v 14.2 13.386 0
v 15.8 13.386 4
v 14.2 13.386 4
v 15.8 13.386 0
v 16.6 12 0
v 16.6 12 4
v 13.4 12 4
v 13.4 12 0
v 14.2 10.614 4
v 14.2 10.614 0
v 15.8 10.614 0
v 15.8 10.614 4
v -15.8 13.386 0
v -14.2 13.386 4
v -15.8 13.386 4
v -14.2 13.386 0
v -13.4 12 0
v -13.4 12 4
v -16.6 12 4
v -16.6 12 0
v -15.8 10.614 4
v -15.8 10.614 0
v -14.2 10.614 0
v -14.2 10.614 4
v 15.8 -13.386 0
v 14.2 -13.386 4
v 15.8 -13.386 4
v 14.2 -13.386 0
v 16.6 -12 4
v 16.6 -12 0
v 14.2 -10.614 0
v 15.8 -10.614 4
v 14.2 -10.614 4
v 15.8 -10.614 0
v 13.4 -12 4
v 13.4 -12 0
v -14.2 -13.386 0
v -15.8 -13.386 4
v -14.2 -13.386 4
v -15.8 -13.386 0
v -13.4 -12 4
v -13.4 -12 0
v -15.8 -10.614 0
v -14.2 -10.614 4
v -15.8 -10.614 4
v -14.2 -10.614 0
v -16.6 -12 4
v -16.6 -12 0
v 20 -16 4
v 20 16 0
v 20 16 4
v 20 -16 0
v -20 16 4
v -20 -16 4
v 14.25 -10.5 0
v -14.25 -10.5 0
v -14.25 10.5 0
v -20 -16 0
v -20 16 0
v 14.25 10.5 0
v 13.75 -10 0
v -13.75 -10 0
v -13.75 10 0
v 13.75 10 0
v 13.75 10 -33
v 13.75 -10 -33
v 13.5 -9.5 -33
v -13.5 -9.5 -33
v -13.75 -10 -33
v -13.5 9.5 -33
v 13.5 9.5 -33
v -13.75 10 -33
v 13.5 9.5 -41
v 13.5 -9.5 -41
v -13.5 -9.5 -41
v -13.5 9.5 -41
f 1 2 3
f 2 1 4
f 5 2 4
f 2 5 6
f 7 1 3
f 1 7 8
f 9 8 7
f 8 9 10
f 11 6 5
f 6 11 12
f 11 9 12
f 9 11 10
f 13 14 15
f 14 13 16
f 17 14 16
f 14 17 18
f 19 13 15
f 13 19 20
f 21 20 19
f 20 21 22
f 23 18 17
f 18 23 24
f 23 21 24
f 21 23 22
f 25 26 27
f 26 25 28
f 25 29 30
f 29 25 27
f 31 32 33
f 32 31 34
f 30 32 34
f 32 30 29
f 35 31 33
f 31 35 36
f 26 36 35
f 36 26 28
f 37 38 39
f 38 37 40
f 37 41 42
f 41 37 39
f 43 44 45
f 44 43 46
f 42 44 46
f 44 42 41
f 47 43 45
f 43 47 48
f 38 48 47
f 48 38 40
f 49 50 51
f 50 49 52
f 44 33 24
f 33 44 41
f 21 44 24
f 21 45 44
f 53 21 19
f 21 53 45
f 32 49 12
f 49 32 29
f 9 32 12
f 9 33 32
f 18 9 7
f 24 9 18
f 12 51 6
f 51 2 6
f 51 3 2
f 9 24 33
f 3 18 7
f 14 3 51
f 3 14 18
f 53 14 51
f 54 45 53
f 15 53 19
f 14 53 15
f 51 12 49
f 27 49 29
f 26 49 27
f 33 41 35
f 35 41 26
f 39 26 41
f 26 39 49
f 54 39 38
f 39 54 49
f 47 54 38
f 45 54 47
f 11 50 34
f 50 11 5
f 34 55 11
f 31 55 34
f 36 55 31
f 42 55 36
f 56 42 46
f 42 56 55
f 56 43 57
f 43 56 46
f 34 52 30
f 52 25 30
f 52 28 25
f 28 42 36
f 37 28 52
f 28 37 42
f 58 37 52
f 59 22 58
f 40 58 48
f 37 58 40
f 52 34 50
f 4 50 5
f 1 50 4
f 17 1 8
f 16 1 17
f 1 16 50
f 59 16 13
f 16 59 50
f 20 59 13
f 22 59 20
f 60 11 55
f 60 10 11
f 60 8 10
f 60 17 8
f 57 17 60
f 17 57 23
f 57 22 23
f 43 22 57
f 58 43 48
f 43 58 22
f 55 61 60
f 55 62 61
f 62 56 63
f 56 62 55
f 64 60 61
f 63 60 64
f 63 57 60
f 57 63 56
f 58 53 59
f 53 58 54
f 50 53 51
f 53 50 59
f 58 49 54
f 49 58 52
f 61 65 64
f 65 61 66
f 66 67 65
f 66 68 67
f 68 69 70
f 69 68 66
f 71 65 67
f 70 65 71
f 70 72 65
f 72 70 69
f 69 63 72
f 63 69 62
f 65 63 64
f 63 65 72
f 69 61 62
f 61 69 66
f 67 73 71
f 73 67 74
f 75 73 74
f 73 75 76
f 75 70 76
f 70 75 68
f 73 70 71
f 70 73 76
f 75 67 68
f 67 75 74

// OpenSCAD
// Parameters
overall_width_mm = 40.0; //[20.0:80.0:0.5]
overall_height_mm = 32.0; //[16.0:64.0:0.5]
panel_thickness_mm = 2.0; //[0.8:6.0:0.1]
cutout_width_mm = 27.5; //[20.0:35.0:0.1]
cutout_height_mm = 20.0; //[14.0:28.0:0.1]
corner_radius_mm = 2.0; //[0.5:5.0:0.1]
flange_thickness_mm = 2.5; //[1.0:6.0:0.1]
bezel_thickness_mm = 1.5; //[0.5:4.0:0.1]
body_depth_mm = 28.0; //[14.0:56.0:0.5]
mount_hole_diameter_mm = 3.2; //[2.0:6.0:0.1]
mount_hole_pitch_x_mm = 30.0; //[20.0:38.0:0.5]
mount_hole_pitch_y_mm = 24.0; //[16.0:30.0:0.5]
clearance_margin_mm = 0.5; //[0.0:2.0:0.1]
rear_clearance_extra_mm = 6.0; //[2.0:20.0:0.5]
terminal_clearance_width_mm = 26.0; //[16.0:40.0:0.5]
terminal_clearance_height_mm = 18.0; //[10.0:30.0:0.5]
terminal_clearance_depth_mm = 14.0; //[8.0:30.0:0.5]
overlap_mm = 1.0; //[0.5:2.0:0.1]

// IEC Flange and Bezel
module iec() {
  color("DimGray") {
    difference() {
      // Flange and Bezel
      translate([0, 0, (flange_thickness_mm + bezel_thickness_mm) / 2])
        cube([overall_width_mm, overall_height_mm, flange_thickness_mm + bezel_thickness_mm], center=true);
      
      // Panel Cutout Profile
      translate([0, 0, -panel_thickness_mm / 2])
        cube([cutout_width_mm + 2 * clearance_margin_mm, cutout_height_mm + 2 * clearance_margin_mm, panel_thickness_mm], center=true);
      
      // Mounting Holes
      union() {
        translate([mount_hole_pitch_x_mm / 2, mount_hole_pitch_y_mm / 2, (flange_thickness_mm + bezel_thickness_mm - panel_thickness_mm) / 2])
          cylinder(r=mount_hole_diameter_mm / 2, h=flange_thickness_mm + bezel_thickness_mm + panel_thickness_mm + 2 * overlap_mm, center=true);
        translate([-mount_hole_pitch_x_mm / 2, mount_hole_pitch_y_mm / 2, (flange_thickness_mm + bezel_thickness_mm - panel_thickness_mm) / 2])
          cylinder(r=mount_hole_diameter_mm / 2, h=flange_thickness_mm + bezel_thickness_mm + panel_thickness_mm + 2 * overlap_mm, center=true);
        translate([mount_hole_pitch_x_mm / 2, -mount_hole_pitch_y_mm / 2, (flange_thickness_mm + bezel_thickness_mm - panel_thickness_mm) / 2])
          cylinder(r=mount_hole_diameter_mm / 2, h=flange_thickness_mm + bezel_thickness_mm + panel_thickness_mm + 2 * overlap_mm, center=true);
        translate([-mount_hole_pitch_x_mm / 2, -mount_hole_pitch_y_mm / 2, (flange_thickness_mm + bezel_thickness_mm - panel_thickness_mm) / 2])
          cylinder(r=mount_hole_diameter_mm / 2, h=flange_thickness_mm + bezel_thickness_mm + panel_thickness_mm + 2 * overlap_mm, center=true);
      }
    }
  }
}

// IEC Inlet Body
module mod() {
  color("Black") {
    // Inlet Body
    translate([0, 0, -body_depth_mm / 2 + overlap_mm])
      cube([cutout_width_mm - 2 * clearance_margin_mm, cutout_height_mm - 2 * clearance_margin_mm, body_depth_mm], center=true);
    
    // Rear Body Depth Clearance
    translate([0, 0, -(body_depth_mm + rear_clearance_extra_mm) / 2 + overlap_mm])
      cube([(cutout_width_mm - 2 * clearance_margin_mm) + 2 * clearance_margin_mm, (cutout_height_mm - 2 * clearance_margin_mm) + 2 * clearance_margin_mm, body_depth_mm + rear_clearance_extra_mm], center=true);
    
    // Terminal Spade Clearance Zone
    translate([0, 0, -body_depth_mm - terminal_clearance_depth_mm / 2 + overlap_mm])
      cube([terminal_clearance_width_mm + 2 * clearance_margin_mm, terminal_clearance_height_mm + 2 * clearance_margin_mm, terminal_clearance_depth_mm], center=true);
  }
}

// Assembly
module assembly() {
  iec();
  mod();
}

assembly();
